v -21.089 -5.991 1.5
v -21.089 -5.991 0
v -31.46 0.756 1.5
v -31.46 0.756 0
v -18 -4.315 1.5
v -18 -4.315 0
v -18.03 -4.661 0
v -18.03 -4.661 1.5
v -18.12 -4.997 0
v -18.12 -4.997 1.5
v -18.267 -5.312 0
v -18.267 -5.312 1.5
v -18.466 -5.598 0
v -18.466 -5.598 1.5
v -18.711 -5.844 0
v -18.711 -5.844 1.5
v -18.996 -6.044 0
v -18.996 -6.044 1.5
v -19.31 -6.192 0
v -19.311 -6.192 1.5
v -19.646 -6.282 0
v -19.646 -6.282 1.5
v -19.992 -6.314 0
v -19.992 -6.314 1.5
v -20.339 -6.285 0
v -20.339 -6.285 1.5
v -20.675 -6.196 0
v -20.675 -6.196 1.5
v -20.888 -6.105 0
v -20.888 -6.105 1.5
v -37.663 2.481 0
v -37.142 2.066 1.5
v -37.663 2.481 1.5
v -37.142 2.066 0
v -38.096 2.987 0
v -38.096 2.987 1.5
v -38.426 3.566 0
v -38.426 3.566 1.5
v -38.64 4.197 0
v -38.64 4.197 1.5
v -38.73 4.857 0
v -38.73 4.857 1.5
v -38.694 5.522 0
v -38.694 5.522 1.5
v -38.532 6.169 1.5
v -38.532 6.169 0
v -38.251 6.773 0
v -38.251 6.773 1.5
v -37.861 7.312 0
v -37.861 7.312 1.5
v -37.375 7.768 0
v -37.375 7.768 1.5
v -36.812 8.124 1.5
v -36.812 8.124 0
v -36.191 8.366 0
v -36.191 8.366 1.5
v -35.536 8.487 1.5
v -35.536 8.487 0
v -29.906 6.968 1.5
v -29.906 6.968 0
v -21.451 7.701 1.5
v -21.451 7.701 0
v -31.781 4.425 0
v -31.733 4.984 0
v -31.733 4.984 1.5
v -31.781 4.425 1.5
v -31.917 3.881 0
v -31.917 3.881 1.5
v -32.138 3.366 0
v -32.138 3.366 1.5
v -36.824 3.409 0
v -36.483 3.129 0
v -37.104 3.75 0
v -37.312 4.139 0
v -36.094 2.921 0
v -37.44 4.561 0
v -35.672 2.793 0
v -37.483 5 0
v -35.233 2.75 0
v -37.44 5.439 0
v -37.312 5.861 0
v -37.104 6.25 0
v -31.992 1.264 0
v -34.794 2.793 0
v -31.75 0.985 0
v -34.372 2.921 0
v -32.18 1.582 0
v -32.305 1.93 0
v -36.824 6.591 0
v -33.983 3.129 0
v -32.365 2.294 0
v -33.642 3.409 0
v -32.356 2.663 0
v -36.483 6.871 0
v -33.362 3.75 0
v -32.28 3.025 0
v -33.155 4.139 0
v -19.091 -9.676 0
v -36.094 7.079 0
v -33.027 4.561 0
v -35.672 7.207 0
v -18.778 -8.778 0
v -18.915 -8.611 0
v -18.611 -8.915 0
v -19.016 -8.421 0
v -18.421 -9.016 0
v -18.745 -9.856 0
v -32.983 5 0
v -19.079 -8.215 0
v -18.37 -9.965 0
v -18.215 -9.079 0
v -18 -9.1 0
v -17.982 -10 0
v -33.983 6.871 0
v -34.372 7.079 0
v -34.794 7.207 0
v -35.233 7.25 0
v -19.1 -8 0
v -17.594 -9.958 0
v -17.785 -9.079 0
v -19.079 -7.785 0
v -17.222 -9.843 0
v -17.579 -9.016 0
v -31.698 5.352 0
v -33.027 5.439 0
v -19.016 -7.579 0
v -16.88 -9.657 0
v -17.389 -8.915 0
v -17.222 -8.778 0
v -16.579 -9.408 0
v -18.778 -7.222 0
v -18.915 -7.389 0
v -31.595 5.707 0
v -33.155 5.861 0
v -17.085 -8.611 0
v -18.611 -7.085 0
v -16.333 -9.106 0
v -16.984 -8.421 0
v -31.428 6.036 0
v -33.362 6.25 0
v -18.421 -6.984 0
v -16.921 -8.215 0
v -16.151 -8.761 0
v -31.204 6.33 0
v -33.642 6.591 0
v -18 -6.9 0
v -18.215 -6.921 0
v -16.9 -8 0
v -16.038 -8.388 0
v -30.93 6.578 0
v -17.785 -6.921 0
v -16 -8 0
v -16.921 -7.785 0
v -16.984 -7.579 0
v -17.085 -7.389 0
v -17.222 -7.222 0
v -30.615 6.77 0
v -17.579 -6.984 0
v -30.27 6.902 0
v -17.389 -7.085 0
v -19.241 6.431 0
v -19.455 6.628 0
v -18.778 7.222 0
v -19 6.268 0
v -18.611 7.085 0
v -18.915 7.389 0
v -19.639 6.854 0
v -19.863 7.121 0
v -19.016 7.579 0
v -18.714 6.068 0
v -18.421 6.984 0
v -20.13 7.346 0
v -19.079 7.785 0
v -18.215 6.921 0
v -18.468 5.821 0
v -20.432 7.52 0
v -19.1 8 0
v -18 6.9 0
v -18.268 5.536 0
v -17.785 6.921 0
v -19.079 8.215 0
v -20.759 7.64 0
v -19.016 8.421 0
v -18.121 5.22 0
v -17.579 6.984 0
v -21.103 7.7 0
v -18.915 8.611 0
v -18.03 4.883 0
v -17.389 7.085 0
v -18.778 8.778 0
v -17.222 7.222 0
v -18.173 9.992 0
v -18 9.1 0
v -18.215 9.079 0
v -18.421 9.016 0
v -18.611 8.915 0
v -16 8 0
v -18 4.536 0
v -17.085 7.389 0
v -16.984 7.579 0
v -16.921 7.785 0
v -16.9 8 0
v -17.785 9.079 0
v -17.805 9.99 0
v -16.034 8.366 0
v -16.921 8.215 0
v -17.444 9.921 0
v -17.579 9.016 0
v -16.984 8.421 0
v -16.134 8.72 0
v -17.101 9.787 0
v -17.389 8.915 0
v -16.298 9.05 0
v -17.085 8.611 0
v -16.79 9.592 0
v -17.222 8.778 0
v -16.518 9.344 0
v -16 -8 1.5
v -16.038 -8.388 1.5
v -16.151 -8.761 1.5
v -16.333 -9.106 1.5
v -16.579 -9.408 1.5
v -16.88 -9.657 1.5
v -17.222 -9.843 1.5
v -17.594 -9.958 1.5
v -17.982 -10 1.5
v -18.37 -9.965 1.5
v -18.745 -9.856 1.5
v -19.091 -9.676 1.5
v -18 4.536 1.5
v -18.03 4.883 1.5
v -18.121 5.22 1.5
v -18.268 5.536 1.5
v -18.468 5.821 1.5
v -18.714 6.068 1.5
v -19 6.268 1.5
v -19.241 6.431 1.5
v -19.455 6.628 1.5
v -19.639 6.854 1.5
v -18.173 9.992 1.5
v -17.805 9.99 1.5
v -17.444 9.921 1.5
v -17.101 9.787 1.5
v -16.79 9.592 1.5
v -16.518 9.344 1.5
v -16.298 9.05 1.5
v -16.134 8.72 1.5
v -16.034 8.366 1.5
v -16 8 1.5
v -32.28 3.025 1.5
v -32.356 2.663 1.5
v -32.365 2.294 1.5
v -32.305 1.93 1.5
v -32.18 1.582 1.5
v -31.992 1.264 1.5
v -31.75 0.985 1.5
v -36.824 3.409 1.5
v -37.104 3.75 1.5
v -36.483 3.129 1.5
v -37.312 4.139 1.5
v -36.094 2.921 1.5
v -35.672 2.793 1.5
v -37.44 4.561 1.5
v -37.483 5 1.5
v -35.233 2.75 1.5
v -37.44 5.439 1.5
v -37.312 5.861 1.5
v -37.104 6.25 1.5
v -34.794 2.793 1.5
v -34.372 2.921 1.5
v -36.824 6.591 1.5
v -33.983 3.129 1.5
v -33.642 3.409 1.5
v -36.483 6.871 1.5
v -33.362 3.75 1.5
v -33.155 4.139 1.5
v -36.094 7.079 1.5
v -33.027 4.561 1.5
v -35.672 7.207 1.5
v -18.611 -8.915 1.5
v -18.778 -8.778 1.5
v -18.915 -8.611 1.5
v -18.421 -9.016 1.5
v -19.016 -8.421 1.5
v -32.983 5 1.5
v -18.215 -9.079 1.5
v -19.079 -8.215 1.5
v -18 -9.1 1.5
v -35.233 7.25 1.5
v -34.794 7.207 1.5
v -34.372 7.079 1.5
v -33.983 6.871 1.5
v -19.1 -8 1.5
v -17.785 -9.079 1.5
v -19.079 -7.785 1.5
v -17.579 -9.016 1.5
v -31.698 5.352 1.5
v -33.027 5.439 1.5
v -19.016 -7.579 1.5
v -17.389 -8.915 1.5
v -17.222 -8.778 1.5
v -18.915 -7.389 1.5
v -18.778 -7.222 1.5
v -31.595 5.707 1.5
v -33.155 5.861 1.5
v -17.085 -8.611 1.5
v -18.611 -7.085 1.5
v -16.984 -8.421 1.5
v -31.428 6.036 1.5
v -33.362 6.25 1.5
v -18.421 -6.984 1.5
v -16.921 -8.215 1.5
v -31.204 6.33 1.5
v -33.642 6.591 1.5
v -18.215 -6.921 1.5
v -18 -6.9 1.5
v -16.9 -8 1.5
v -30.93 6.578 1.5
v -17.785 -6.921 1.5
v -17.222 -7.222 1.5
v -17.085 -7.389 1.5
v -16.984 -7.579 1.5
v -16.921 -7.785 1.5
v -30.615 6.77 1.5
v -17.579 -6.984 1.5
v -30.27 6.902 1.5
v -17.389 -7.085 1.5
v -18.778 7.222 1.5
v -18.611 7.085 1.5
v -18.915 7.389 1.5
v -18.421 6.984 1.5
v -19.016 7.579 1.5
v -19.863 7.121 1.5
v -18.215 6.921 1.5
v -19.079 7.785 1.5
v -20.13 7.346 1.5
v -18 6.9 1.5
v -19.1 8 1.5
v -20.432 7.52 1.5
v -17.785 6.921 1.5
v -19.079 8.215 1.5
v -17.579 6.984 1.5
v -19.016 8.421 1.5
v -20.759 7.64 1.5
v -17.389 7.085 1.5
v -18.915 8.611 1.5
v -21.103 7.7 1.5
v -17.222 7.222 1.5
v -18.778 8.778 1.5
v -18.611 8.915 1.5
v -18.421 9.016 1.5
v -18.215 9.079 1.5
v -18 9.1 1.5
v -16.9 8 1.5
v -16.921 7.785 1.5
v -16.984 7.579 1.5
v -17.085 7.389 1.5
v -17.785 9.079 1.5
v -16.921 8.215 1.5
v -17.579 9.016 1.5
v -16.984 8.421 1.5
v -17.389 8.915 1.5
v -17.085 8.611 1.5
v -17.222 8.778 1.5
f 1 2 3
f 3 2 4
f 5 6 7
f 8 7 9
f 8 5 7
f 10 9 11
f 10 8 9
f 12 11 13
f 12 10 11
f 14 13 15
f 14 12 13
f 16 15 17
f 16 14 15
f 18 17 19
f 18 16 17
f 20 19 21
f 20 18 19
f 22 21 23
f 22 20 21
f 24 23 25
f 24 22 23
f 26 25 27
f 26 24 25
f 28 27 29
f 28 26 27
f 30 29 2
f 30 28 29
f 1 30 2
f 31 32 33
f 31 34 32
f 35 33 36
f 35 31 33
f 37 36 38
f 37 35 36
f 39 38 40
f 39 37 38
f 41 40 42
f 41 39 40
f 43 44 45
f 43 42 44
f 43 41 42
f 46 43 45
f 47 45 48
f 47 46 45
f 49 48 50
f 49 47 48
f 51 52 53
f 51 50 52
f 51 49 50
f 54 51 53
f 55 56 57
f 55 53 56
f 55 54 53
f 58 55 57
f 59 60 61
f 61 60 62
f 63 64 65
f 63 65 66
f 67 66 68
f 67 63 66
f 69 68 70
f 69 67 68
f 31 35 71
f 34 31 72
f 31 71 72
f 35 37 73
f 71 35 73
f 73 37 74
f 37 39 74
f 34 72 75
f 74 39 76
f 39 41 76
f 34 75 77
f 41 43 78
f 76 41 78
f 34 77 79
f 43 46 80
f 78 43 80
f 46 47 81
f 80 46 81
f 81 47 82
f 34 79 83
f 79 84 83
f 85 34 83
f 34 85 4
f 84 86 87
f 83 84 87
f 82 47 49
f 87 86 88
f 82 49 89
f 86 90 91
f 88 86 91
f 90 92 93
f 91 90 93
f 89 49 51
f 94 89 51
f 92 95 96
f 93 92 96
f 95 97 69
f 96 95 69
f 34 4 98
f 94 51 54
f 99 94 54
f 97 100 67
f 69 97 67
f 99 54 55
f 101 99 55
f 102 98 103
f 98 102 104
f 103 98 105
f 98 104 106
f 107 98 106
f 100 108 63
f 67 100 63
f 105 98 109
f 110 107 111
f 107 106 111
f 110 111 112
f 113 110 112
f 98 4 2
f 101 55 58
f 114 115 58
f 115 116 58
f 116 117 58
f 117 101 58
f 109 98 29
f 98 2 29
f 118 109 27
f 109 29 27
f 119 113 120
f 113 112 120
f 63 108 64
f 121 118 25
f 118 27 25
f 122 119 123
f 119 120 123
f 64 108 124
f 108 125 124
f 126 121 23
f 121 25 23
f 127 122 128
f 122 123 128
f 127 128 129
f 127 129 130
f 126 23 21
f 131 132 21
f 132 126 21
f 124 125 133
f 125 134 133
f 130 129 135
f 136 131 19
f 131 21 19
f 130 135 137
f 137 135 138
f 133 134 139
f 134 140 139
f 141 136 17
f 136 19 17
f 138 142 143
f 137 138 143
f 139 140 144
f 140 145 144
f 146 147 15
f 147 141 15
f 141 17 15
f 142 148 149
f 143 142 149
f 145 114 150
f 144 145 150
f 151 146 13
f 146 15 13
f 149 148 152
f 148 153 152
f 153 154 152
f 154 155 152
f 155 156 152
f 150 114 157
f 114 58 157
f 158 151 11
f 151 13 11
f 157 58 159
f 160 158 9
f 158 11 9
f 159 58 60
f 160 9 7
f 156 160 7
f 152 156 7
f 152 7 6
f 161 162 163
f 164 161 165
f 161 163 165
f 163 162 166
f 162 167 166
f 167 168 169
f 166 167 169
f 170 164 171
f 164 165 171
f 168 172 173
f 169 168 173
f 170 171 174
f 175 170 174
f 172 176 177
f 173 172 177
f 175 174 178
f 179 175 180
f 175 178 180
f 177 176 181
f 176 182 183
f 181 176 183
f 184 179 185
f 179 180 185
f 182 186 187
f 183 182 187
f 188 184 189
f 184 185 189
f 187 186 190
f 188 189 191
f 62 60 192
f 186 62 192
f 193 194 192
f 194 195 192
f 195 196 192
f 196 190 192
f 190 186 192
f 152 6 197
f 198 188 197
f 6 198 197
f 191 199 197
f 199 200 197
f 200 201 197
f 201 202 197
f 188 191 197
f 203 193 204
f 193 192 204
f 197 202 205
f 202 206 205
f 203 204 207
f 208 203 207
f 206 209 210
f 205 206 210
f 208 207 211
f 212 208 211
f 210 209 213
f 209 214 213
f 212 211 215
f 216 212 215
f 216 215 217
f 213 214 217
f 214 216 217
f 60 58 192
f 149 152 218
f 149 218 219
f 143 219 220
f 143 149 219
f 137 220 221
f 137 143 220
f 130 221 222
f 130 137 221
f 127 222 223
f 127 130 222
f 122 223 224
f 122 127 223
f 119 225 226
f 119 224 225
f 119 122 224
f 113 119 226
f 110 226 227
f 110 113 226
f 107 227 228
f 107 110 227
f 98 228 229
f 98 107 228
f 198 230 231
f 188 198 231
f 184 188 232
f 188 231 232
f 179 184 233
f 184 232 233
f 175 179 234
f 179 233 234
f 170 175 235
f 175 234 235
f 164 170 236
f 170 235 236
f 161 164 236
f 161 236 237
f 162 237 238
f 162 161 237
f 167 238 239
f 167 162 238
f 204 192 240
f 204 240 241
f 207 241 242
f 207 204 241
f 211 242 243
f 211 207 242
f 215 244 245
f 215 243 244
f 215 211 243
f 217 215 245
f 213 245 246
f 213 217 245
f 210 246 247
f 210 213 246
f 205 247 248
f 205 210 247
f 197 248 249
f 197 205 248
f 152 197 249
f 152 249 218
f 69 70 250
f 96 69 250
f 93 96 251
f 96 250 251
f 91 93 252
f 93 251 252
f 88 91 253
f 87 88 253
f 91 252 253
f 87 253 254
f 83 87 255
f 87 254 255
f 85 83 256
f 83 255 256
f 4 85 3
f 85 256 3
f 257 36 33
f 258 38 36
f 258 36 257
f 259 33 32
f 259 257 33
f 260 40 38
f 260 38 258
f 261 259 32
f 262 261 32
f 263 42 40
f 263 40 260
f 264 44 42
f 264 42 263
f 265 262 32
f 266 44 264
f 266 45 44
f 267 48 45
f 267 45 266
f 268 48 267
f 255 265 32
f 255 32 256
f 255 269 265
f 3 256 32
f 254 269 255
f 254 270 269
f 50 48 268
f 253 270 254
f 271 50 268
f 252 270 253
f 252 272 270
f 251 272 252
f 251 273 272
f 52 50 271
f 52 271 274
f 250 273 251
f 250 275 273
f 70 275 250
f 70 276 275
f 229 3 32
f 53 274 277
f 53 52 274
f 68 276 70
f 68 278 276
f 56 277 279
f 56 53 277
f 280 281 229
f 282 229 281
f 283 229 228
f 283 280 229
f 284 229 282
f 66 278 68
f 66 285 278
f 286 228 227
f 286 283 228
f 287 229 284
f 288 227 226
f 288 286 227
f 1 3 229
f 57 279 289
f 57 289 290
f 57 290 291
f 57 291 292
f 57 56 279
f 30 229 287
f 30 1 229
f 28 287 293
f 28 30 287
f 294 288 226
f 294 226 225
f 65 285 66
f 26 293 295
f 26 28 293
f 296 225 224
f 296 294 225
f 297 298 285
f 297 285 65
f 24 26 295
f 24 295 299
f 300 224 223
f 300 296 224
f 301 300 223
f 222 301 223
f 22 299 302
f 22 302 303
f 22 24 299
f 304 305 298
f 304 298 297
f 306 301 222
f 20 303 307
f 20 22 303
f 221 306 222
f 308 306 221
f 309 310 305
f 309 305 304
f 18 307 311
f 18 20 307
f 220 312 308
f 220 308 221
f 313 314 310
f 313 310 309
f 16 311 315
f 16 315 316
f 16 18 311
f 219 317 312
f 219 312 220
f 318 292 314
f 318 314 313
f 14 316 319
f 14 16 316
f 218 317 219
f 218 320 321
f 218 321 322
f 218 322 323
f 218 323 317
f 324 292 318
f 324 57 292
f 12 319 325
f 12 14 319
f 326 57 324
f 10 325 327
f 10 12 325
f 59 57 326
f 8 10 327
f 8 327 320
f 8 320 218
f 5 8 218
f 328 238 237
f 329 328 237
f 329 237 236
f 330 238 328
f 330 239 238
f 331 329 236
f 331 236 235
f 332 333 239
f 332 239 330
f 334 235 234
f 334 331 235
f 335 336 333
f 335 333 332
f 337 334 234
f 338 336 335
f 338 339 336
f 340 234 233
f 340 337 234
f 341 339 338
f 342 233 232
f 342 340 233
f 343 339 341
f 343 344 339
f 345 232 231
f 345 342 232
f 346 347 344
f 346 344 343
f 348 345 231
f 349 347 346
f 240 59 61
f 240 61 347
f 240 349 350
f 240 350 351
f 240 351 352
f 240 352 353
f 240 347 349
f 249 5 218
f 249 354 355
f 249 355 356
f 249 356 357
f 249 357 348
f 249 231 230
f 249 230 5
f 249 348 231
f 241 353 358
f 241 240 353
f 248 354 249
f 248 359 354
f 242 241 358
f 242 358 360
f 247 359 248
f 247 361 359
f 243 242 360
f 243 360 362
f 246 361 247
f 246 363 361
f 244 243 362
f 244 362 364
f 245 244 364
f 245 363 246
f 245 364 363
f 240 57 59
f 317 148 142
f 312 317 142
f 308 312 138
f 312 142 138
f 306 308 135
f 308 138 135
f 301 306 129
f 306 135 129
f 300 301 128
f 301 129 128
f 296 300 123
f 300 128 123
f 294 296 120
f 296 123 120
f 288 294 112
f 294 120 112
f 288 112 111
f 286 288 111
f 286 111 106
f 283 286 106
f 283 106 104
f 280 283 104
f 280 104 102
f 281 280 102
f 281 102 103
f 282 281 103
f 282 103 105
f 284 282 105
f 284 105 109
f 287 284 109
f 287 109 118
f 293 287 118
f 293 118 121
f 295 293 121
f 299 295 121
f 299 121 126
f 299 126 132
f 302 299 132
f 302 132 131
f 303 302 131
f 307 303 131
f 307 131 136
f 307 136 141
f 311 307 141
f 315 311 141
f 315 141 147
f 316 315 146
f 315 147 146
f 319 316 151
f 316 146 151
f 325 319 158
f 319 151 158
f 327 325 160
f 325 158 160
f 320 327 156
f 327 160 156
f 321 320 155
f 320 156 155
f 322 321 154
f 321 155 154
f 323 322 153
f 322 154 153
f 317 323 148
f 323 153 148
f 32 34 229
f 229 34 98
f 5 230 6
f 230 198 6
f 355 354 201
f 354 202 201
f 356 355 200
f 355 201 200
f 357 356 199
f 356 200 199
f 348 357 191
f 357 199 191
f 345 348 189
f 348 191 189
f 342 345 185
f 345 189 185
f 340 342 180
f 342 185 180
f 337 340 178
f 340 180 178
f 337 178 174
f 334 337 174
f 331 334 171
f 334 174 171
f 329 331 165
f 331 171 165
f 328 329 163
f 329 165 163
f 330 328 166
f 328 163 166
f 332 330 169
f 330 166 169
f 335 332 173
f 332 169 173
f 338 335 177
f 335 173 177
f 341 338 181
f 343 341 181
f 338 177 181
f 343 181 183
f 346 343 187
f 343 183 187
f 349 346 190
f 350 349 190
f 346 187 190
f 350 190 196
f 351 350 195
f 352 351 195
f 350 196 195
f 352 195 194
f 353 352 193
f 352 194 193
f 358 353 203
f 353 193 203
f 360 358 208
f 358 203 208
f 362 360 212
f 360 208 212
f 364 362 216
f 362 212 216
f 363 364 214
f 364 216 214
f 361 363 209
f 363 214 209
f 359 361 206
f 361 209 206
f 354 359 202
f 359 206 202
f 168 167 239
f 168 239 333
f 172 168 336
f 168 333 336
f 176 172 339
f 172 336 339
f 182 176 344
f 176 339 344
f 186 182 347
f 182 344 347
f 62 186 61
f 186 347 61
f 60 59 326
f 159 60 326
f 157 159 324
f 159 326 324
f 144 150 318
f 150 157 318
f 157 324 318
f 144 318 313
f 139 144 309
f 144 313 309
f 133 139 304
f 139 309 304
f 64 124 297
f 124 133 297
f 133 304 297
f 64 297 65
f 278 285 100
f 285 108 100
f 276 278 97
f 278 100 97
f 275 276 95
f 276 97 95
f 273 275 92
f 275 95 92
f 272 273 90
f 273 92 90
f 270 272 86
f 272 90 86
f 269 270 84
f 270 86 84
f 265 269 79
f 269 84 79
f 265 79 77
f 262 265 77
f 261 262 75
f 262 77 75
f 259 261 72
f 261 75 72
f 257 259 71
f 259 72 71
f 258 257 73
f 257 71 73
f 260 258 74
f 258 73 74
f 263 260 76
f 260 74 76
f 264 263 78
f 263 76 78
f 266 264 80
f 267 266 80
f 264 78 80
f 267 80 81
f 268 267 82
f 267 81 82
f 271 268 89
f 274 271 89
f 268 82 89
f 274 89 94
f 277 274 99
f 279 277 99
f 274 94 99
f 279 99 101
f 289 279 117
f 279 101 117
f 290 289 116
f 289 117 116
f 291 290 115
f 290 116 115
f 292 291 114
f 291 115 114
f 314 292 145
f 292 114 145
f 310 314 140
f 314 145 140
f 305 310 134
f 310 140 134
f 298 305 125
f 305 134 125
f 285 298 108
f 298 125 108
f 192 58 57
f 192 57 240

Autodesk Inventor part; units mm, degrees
ref_plane "YZ Plane" through (0, 0, 0) normal (1, 0, 0) x (0, 1, 0)
ref_plane "XZ Plane" through (0, 0, 0) normal (0, 1, 0) x (-1, 0, 0)
ref_plane "XY Plane" through (0, 0, 0) normal (0, 0, 1) x (1, 0, 0)
sketch "スケッチ1" plane through (0, 0, 0) normal (0, 0, 1) x (1, 0, 0)
  line L0 (-18, -8) -> (18, -8) construction
  line L1 (18, -8) -> (18, 8) construction
  line L2 (18, 8) -> (-18, 8) construction
  line L3 (-18, 8) -> (-18, -8) construction
  line L4 (-18, -8) -> (18, 8) construction
  line L5 (18, -8) -> (-18, 8) construction
  circle A0 centre (-18, 8) radius 1.1
  circle A1 centre (18, 8) radius 1.1
  circle A2 centre (-18, -8) radius 1.1
  circle A3 centre (18, -8) radius 1.1
  circle A4 centre (-18, 8) radius 2
  circle A5 centre (-18, -8) radius 2
  line L6 (-16, 8) -> (-16, -8)
  circle A6 centre (-35.2333, 5) radius 2.25
  circle A7 centre (-35.2333, 5) radius 3.5
  line L7 (-35.5357, 8.4869) -> (-18.1728, 9.9925)
  line L8 (-37.1418, 2.0661) -> (-19.0906, -9.6765)
  circle A8 centre (11.5, 0) radius 8 projected
  line L9 (-35.2333, 5) -> (11.5, 0) construction
  point P0 (0, 0)
  point P1 (-16, 0)
  dimension "d0" = 36
  dimension "d1" = 16
  dimension "d2" = 2.2
  dimension "d5" = 36
  dimension "d8" = 16
  dimension "d11" = 4
  dimension "d12" = 4
  dimension "d13" = 4.5
  dimension "d14" = 7
  dimension "d16" = 5
  dimension "d19" = 47
extrude "押し出し1" add sketch "スケッチ1" along normal blind 1.5 contours A4 | L6 A5 L8 A7 L7 A4 | A5 | A7
sketch "スケッチ2" plane through (0, 0, 0) normal (0, 0, -1) x (-1, 0, 0)
  line L0 (37.1418, 2.0661) -> (19.0906, -9.6765) projected
  arc A0 (37.1418, 2.0661) -> (35.5357, 8.4869) centre (35.2333, 5) ccw projected
  line L1 (18.1728, 9.9925) -> (35.5357, 8.4869) projected
  arc A1 (18.1728, 9.9925) -> (16, 8) centre (18, 8) ccw projected
  line L2 (16, -8) -> (16, 8) projected
  arc A2 (16, -8) -> (19.0906, -9.6765) centre (18, -8) ccw projected
  circle A3 centre (18, -8) radius 1.1 projected
  circle A4 centre (18, 8) radius 1.1 projected
  circle A5 centre (35.2333, 5) radius 2.25 projected
  line L3 (18, -8) -> (36.0512, 3.7426)
  arc A6 (36.0512, 3.7426) -> (35.3629, 6.4944) centre (35.2333, 5) ccw
  line L4 (35.3629, 6.4944) -> (18, 8)
  line L5 (18, 8) -> (18, -8)
  circle A7 centre (18, 8) radius 2
  circle A8 centre (18, -8) radius 2
  circle A9 centre (35.2333, 5) radius 3.5
  point P0 (0, 0)
  point P1 (33.4005, 2.0183)
  point P2 (32.2124, 6.7676)
  point P3 (19.9925, 7.8272)
  point P4 (18, 6)
  point P5 (33.6921, 6.6393)
  point P6 (34.6454, 2.8281)
  point P7 (20, 7.9971)
  point P8 (18.4708, 6.0562)
  point P9 (19, 2.9103)
  point P10 (18, -6.9)
  point P11 (18.9221, -7.4002)
  point P12 (18, -6)
  point P13 (19.6765, -6.9094)
  point P14 (18, 6.9)
  point P15 (19.0959, 7.905)
  dimension "d20" = 2
extrude "押し出し2" cut sketch "スケッチ2" against normal through all contours L3 A8 L5 A7 L4 A9 | A5 L4 A6 L3 | L3 L5 A3 | A4 L5 L4 picked at (34.8052, 4.9839) picked at (18.0902, -7.2779) picked at (18.7117, 7.8482)
fillet "フィレット1" radius 2 6 edges at (-33.4005, 2.0183, 0.75) (-32.2124, 6.7676, 0.75) (-18, -6, 0.75) (-19.6765, -6.9094, 0.75) (-18, 6, 0.75) (-19.9925, 7.8272, 0.75)
equation "\"d5\" = d0"
equation "\"d8\" = d1"
properties part number "servolink" material "アルミニウム 2014-T4"
